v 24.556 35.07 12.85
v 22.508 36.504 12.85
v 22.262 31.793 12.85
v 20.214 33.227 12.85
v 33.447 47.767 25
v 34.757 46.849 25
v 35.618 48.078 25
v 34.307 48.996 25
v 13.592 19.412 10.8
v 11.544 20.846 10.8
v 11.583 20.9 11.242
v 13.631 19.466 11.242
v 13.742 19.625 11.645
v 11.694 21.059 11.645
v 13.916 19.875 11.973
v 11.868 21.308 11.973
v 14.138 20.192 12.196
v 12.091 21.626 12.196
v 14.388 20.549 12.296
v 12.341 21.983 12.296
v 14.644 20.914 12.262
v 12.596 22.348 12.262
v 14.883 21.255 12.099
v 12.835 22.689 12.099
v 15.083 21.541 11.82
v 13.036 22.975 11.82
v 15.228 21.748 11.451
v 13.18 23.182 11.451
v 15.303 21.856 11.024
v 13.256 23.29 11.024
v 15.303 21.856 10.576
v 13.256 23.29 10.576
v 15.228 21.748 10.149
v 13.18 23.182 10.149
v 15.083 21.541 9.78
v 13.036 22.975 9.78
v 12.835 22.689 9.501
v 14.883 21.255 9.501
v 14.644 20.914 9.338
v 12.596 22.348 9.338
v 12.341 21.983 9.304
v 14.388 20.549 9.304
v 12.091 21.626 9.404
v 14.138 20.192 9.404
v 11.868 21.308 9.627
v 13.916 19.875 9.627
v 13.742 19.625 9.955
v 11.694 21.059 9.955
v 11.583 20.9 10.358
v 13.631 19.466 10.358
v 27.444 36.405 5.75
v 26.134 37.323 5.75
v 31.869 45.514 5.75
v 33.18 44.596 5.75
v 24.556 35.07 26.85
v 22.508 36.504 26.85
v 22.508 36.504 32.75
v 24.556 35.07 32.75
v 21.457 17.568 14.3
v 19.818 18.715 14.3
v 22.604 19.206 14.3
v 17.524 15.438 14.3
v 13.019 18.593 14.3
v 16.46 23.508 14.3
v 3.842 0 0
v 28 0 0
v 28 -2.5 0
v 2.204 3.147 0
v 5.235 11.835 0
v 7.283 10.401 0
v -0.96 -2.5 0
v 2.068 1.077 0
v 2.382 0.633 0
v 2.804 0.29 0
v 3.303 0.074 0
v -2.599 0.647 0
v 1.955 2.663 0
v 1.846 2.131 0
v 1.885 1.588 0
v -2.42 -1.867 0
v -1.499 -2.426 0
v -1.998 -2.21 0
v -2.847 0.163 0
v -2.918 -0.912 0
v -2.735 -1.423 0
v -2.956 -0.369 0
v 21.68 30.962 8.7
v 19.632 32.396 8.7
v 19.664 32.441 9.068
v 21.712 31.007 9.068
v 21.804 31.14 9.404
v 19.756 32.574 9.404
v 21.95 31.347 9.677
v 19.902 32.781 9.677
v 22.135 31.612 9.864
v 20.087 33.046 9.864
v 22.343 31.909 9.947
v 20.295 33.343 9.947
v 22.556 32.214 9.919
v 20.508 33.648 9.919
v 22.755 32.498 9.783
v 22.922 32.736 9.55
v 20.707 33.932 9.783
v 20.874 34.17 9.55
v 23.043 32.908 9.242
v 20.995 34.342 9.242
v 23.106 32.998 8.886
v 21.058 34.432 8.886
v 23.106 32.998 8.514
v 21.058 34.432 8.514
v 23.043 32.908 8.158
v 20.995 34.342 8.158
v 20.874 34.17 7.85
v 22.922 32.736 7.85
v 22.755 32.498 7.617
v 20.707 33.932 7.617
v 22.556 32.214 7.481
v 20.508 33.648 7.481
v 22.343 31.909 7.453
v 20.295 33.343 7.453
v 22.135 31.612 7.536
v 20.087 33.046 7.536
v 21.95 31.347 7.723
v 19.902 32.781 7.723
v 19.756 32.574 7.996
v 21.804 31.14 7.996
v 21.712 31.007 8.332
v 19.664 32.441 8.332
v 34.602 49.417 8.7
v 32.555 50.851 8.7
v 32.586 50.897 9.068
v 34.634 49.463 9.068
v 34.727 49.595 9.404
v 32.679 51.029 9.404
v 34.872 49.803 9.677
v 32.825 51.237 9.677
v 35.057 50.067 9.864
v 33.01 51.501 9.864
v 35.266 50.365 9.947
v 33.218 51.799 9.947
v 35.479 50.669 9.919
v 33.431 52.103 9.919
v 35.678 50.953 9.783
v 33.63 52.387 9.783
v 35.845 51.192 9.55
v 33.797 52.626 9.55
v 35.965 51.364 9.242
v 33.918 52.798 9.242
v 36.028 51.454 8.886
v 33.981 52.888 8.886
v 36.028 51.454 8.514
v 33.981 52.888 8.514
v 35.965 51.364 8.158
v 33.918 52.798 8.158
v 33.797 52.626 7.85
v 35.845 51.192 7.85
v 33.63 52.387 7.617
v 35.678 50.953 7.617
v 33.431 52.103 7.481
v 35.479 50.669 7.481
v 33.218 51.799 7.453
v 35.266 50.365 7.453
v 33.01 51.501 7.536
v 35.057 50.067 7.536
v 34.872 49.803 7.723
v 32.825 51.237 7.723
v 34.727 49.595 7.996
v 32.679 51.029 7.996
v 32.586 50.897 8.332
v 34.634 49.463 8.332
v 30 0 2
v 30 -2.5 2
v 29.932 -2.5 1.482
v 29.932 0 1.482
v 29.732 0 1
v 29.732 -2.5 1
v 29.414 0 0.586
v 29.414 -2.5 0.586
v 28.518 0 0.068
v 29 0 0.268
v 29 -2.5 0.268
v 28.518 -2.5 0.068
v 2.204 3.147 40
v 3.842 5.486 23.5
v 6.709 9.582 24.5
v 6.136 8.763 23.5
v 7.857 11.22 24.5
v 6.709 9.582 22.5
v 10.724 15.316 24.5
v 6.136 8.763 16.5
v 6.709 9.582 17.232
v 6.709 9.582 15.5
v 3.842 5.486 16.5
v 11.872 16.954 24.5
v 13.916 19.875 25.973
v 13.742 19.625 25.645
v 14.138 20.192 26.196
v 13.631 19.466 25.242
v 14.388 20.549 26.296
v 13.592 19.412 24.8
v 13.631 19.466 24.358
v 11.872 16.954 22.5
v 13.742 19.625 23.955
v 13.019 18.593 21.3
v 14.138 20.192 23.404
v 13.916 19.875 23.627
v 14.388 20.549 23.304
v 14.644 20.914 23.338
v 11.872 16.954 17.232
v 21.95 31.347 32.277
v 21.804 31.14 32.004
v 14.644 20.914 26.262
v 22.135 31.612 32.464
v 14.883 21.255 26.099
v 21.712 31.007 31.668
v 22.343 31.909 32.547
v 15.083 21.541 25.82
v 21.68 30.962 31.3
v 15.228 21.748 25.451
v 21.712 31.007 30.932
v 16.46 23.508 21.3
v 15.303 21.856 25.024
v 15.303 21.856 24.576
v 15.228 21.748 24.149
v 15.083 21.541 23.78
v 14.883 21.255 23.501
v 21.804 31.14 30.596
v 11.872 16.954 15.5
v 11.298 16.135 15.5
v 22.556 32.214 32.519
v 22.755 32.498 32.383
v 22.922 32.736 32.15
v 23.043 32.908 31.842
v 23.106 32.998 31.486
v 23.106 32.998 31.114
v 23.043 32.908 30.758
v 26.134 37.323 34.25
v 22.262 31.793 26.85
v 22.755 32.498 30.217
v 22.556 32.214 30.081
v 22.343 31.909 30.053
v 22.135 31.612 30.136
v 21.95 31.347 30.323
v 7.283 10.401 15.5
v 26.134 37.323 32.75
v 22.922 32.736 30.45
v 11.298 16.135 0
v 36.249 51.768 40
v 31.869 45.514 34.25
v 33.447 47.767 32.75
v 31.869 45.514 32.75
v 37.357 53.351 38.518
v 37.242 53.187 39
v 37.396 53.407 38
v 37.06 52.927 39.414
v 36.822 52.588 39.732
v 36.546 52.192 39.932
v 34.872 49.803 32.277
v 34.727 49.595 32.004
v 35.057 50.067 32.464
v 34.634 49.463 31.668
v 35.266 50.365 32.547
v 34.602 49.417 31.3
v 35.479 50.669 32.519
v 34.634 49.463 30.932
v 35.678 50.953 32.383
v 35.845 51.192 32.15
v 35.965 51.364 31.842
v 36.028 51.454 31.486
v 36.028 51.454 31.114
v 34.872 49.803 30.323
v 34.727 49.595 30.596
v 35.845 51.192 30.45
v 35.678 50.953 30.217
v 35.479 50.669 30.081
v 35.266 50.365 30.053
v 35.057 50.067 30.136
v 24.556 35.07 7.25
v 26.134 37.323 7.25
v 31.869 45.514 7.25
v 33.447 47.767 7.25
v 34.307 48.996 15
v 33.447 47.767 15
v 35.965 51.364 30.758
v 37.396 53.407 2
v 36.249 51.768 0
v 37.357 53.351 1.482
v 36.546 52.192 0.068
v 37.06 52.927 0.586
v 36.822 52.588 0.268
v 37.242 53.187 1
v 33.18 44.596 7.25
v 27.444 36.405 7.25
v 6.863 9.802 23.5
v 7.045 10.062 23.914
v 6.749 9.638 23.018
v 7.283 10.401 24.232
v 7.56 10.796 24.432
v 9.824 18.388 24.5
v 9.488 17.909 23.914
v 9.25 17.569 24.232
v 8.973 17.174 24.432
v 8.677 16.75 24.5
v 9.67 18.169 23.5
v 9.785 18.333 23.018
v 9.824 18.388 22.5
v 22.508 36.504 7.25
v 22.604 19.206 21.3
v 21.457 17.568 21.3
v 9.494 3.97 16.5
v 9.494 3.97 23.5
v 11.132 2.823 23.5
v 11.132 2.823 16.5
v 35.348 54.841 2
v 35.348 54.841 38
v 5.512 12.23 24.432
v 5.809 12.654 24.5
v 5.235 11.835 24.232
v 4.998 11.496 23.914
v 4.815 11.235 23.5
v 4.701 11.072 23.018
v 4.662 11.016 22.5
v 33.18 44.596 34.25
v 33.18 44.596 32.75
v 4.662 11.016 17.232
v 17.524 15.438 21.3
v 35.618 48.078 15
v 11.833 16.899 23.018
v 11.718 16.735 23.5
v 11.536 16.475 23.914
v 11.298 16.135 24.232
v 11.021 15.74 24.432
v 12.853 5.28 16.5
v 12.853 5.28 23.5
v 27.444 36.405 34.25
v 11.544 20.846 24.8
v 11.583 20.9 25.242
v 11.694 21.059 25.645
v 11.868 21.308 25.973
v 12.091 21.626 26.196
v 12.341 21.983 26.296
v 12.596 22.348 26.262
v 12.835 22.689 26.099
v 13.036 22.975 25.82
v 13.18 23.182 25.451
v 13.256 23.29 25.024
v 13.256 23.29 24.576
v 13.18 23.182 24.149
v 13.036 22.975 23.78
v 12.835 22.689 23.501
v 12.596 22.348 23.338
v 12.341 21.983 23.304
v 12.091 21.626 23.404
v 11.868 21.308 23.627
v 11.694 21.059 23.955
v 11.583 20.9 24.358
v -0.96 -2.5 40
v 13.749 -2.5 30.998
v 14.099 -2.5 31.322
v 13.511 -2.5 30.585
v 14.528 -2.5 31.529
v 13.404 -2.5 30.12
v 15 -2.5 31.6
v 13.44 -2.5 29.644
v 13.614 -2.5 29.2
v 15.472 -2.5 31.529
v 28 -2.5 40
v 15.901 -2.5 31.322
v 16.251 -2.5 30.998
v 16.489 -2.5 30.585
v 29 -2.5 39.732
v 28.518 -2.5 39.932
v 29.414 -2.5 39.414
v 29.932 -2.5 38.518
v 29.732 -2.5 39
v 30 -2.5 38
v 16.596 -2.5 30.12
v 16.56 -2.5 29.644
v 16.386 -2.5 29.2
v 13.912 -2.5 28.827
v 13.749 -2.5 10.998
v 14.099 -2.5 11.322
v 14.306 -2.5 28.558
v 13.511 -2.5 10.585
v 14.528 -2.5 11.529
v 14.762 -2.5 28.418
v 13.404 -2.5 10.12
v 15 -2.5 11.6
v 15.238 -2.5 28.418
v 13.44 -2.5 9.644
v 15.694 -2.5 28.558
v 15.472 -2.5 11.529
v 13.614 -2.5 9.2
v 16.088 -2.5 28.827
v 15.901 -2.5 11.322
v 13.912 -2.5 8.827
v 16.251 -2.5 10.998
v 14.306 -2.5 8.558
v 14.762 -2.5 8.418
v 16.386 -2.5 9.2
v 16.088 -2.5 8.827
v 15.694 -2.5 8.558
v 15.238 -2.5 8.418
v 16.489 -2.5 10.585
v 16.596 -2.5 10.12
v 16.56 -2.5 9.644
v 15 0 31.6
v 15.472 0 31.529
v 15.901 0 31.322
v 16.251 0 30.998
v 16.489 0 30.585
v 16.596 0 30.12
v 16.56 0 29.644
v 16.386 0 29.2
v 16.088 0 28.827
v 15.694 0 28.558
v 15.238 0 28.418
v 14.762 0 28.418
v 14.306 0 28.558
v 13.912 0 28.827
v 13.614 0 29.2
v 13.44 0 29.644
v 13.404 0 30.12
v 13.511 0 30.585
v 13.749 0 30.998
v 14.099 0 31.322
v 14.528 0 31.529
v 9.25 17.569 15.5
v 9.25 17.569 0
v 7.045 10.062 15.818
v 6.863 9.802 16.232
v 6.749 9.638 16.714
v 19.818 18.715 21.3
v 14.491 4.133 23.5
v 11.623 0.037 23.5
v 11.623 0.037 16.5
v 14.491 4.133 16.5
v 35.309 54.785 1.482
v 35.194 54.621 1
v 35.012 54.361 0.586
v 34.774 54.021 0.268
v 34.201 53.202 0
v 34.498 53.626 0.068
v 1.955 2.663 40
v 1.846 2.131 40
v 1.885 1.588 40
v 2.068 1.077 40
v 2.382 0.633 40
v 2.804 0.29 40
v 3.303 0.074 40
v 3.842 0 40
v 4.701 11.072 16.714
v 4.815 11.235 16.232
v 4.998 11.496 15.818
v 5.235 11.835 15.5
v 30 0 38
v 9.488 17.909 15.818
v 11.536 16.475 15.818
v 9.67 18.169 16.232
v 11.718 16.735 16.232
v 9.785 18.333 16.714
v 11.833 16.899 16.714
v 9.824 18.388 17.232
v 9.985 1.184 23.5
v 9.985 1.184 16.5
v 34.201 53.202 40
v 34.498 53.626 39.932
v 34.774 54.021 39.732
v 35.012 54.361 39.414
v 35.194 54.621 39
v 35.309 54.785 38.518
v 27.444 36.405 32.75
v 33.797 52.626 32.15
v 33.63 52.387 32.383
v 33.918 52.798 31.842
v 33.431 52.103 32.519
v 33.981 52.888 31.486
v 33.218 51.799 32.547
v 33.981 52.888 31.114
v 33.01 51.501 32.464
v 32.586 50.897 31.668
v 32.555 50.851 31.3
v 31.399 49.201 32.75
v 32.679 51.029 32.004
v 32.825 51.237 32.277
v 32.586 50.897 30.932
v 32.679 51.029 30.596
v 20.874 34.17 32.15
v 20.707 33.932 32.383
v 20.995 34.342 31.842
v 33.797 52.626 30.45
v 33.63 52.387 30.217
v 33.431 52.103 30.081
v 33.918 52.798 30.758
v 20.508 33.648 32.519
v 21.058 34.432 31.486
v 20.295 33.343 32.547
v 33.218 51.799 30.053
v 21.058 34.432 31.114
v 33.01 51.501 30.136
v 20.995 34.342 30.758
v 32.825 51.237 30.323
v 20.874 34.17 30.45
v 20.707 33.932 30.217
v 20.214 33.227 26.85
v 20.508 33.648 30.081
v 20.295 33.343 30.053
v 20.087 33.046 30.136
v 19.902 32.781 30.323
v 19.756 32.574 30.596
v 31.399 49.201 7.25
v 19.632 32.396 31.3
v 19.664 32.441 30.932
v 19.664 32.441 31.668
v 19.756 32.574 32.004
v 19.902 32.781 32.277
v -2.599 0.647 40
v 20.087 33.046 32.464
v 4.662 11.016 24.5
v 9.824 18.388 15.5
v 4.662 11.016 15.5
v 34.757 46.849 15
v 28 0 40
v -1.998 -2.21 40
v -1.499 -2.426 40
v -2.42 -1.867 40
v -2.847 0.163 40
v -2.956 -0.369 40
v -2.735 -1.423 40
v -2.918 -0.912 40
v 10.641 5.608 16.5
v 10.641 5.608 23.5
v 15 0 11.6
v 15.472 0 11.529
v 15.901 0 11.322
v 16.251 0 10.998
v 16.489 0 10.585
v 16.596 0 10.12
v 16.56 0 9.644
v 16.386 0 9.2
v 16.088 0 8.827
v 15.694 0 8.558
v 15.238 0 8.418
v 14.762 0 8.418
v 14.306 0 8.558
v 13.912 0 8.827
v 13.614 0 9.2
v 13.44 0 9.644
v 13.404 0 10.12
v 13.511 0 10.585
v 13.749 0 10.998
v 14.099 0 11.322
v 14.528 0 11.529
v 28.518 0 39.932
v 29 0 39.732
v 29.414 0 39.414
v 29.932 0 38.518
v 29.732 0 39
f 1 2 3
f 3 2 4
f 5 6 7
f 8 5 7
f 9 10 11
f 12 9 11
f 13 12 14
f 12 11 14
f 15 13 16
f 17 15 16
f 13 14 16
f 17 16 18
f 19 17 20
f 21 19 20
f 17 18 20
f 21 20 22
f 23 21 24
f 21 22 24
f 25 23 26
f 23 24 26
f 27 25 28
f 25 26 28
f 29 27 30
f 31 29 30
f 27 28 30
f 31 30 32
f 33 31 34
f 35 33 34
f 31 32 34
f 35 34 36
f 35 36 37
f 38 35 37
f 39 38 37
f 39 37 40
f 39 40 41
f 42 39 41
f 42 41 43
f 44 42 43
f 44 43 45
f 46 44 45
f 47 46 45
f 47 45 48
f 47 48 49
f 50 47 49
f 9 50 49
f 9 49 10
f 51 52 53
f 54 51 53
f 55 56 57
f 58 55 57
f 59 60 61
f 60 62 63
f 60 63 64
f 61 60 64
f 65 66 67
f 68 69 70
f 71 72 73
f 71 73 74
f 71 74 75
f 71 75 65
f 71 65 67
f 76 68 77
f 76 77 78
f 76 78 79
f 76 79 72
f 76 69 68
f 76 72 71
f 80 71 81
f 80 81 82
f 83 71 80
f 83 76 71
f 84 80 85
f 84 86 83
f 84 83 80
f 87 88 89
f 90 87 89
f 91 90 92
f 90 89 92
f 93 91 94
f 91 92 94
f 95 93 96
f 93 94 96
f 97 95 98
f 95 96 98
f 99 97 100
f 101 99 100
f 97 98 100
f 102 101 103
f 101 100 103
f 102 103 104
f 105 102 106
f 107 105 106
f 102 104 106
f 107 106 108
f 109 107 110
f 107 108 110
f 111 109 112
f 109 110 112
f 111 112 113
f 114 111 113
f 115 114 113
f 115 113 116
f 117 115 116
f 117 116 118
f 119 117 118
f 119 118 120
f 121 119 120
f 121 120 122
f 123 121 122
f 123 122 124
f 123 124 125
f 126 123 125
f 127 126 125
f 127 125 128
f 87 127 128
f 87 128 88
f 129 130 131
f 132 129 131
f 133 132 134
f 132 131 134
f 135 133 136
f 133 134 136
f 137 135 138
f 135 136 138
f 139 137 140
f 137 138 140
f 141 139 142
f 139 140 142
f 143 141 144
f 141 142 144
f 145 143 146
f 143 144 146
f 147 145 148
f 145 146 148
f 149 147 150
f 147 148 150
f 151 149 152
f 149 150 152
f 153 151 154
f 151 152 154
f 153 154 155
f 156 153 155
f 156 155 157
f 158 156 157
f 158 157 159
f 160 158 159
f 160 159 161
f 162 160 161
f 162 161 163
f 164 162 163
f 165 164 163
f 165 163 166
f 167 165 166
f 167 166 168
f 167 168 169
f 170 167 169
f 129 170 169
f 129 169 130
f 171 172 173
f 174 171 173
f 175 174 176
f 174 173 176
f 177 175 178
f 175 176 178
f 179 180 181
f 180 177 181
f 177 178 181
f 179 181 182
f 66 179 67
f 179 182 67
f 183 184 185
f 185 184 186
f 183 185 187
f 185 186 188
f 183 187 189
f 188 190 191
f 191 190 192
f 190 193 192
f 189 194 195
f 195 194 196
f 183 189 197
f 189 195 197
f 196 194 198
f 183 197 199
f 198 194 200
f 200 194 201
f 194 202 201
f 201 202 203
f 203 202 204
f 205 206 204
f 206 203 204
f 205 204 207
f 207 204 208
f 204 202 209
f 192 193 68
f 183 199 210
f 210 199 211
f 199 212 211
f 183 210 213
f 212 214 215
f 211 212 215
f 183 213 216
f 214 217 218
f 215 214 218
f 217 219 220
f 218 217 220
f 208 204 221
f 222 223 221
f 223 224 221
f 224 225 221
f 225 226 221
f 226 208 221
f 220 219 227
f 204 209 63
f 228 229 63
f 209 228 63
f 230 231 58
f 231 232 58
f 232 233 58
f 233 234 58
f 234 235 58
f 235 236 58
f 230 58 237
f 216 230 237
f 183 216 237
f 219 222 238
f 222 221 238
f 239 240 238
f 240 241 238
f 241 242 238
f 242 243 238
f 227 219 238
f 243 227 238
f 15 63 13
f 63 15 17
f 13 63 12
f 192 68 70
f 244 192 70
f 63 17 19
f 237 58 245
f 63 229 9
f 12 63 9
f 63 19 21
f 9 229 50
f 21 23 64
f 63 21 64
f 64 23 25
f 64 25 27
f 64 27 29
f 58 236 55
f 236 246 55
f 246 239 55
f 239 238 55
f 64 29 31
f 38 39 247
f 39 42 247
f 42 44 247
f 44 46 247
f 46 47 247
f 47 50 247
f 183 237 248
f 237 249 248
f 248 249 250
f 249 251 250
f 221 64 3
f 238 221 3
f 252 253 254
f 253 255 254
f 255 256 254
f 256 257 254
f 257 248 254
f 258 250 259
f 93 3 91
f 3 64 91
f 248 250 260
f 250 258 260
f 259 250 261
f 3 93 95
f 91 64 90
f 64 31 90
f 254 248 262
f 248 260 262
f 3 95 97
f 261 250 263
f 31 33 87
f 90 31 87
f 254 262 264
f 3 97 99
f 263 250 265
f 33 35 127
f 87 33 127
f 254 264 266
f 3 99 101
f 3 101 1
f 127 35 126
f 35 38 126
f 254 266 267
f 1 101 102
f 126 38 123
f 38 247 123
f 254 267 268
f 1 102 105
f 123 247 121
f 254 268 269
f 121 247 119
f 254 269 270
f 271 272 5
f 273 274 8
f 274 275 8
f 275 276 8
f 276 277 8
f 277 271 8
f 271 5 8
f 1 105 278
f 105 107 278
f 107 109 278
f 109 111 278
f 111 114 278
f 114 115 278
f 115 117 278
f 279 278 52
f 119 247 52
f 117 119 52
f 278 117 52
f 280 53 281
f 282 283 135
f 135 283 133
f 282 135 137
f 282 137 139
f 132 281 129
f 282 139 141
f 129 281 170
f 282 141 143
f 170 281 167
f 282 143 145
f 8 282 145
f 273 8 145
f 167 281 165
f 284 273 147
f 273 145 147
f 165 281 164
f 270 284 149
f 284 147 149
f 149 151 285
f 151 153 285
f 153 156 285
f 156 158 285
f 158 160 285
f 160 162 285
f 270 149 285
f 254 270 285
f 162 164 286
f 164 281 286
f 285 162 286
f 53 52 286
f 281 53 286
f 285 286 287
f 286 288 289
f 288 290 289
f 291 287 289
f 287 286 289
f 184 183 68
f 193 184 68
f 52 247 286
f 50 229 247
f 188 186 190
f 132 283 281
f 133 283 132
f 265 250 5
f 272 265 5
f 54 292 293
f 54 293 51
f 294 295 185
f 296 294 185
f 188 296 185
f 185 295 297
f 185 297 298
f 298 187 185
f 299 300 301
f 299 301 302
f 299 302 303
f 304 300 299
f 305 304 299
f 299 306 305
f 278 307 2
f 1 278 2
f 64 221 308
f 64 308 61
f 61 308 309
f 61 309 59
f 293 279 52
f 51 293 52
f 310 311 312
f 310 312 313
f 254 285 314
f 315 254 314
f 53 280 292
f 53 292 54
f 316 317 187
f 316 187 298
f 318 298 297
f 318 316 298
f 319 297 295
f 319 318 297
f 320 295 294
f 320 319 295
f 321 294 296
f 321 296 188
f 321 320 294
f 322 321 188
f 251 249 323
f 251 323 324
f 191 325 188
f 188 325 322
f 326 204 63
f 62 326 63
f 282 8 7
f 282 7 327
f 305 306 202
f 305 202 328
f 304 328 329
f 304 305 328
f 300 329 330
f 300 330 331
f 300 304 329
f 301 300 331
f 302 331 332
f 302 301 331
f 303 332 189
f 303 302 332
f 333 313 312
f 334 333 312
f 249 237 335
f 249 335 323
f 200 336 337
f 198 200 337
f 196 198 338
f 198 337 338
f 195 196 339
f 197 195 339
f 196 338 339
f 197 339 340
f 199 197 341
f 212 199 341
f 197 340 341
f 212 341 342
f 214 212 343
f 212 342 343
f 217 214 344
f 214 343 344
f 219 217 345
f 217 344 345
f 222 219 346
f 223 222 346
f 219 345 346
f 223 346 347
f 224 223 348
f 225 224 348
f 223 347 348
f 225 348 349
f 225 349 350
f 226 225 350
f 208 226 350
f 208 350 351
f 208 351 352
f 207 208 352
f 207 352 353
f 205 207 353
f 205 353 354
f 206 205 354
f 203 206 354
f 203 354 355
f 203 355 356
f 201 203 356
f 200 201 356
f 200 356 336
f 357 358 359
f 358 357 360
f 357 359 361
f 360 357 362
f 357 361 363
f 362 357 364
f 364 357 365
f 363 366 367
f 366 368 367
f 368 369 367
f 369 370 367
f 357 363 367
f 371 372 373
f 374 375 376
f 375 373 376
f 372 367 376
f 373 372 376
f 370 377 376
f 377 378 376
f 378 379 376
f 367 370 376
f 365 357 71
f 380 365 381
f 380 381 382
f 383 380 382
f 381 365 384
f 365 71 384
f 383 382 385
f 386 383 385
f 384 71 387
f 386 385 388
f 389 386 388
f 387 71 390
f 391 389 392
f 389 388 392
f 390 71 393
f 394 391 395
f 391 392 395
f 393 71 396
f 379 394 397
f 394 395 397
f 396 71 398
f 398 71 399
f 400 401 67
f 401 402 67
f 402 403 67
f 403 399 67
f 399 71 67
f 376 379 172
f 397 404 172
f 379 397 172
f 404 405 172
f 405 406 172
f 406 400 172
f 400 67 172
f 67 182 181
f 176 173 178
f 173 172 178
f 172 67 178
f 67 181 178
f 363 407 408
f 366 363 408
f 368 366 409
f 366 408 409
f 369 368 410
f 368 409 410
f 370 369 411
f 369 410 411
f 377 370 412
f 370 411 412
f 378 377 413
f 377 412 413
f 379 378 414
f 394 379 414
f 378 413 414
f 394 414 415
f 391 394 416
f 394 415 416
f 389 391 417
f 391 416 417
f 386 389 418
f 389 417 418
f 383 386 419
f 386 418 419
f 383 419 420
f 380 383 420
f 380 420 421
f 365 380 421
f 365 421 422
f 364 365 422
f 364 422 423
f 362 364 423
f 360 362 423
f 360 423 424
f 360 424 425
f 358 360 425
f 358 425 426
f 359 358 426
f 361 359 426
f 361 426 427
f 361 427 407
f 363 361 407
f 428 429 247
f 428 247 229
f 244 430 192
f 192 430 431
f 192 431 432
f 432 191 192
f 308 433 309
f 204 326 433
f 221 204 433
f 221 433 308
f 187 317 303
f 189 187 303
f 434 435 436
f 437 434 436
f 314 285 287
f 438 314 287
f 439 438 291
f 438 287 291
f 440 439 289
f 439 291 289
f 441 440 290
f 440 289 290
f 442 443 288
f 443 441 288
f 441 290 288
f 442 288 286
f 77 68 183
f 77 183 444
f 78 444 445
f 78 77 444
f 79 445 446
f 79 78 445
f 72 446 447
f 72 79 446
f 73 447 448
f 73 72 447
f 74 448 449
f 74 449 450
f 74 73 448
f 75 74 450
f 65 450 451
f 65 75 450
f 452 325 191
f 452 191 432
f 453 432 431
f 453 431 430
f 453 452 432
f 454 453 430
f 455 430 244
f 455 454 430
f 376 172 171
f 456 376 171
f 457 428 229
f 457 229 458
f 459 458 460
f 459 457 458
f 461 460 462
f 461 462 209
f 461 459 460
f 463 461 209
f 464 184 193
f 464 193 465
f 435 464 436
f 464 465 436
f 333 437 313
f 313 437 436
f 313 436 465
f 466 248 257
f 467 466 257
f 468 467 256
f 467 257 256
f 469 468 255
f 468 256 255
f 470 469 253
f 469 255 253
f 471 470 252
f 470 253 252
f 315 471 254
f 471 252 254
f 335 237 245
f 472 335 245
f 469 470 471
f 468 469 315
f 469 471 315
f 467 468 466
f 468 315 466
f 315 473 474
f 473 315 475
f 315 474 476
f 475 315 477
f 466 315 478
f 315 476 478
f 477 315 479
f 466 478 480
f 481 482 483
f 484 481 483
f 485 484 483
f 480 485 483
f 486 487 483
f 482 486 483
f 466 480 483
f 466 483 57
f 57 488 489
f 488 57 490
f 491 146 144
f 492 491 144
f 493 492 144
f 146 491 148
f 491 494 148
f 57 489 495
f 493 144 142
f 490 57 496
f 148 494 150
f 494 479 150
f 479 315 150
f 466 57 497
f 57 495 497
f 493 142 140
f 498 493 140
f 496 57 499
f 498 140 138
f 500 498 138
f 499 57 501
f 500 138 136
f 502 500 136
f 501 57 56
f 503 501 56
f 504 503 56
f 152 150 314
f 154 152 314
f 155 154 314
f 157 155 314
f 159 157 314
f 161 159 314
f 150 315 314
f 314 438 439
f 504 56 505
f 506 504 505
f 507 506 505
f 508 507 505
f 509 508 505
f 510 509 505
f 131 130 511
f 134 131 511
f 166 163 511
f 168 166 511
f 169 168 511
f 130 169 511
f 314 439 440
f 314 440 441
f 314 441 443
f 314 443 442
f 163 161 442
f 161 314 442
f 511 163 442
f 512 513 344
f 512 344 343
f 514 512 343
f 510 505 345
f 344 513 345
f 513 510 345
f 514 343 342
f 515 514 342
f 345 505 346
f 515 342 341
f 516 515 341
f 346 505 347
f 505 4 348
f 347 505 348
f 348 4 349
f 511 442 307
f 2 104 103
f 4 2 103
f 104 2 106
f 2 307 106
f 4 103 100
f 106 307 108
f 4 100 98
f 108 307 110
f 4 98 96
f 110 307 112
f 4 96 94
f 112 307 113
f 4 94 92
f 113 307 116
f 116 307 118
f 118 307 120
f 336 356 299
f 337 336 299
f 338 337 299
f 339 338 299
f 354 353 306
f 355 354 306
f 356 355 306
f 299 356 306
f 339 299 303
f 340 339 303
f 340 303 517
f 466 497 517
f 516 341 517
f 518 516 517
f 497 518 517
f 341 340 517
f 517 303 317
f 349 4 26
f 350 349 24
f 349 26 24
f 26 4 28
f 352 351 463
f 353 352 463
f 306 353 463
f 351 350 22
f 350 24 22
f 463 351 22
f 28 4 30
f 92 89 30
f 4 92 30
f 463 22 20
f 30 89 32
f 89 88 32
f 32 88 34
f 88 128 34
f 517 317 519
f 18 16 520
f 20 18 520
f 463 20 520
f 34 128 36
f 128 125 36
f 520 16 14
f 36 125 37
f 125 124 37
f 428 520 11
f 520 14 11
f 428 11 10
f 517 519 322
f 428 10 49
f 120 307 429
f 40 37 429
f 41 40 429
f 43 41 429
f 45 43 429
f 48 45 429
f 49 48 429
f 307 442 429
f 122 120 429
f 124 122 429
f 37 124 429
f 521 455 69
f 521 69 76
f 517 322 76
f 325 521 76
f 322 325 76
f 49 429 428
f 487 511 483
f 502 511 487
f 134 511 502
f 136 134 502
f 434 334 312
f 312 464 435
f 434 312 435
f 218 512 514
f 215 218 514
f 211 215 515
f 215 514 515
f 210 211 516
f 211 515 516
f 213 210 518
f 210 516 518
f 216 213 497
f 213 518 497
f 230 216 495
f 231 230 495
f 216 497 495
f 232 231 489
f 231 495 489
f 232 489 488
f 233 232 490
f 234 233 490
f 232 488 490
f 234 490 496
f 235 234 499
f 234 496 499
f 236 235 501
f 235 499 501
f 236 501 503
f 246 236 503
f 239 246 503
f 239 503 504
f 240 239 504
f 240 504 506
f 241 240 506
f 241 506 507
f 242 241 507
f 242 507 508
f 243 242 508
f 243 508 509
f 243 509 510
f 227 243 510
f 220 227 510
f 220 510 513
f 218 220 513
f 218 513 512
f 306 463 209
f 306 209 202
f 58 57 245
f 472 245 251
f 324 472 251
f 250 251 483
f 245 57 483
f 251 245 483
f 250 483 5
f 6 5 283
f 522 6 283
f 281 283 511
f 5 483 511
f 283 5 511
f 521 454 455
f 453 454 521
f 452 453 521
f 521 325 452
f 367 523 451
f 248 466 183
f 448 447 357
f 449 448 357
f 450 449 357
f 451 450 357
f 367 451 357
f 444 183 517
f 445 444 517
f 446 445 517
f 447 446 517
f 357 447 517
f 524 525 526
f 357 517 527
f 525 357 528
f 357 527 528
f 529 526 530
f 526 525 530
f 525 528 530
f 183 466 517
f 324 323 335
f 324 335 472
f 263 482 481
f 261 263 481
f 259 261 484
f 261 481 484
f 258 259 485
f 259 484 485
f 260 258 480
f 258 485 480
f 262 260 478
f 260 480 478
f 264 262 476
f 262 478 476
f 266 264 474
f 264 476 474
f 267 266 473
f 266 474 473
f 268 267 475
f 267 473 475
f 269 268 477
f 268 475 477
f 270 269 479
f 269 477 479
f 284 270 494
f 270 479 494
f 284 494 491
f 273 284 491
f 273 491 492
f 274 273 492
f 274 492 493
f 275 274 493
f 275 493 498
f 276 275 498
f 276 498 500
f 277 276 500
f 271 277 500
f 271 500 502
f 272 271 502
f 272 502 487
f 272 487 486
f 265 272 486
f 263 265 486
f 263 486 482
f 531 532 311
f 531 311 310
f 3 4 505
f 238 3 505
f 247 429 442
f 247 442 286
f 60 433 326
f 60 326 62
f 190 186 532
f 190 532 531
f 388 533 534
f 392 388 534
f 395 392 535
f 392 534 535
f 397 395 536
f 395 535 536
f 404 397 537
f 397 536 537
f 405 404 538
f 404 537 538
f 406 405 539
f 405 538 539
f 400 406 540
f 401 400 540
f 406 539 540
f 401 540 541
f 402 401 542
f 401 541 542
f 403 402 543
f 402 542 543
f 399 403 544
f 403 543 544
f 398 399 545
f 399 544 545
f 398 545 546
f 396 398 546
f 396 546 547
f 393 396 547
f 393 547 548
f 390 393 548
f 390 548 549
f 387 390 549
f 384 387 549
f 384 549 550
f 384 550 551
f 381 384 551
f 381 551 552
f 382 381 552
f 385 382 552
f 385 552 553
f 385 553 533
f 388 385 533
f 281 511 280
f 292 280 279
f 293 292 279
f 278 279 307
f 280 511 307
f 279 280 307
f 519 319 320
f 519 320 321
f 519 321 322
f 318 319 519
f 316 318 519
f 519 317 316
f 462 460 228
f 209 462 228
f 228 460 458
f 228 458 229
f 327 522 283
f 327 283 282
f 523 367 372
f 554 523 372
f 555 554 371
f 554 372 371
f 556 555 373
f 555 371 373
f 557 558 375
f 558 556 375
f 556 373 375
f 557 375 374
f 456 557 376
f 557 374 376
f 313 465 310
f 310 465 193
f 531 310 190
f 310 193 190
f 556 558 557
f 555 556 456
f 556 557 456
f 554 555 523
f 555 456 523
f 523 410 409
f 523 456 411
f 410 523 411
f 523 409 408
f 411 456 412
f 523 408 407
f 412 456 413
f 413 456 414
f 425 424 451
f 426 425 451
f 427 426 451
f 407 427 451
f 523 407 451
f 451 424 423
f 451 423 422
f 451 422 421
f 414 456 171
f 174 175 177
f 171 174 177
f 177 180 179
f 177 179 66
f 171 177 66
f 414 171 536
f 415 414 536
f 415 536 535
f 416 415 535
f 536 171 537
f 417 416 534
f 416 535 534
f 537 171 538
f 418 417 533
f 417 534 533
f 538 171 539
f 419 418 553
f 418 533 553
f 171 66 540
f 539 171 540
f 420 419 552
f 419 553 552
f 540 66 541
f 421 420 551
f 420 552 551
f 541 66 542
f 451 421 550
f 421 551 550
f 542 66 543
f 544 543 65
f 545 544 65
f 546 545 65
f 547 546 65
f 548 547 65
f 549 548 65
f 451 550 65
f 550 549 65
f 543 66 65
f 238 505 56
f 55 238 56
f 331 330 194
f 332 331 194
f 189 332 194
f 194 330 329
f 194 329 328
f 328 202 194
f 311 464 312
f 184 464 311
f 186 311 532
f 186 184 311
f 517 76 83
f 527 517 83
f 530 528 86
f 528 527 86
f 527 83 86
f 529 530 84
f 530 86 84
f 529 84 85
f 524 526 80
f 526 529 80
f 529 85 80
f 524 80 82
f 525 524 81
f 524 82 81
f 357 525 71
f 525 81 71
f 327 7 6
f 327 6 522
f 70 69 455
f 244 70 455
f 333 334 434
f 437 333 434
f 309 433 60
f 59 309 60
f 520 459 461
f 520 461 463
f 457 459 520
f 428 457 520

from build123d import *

# Parameters (mm, degrees)
BOSS_EXTRUDE1_DEPTH      = 40
SKETCH2_R                = 1.25
SKETCH2_R_2              = 1.5
SKETCH2_W                = 9
SKETCH2_H                = 9
SKETCH2_W_2              = 15.5
SKETCH2_H_2              = 7
CUT_EXTRUDE2_DEPTH       = 5
SKETCH4_W                = 7
SKETCH4_H                = 4
SKETCH4_H_2              = 2
BOSS_EXTRUDE2_DEPTH      = 5.5
SKETCH6_W                = 7
SKETCH6_H                = 2
BOSS_EXTRUDE3_DEPTH      = 7.5
BOSS_EXTRUDE4_DEPTH      = 3
BOSS_EXTRUDE4_DEPTH_BACK = 2
SKETCH10_W               = 1.5
SKETCH10_H               = 10
SKETCH10_W_2             = 10
SKETCH10_H_2             = 1.5
BOSS_EXTRUDE6_DEPTH      = 1.6
SKETCH5_R                = 1.6
CUT_EXTRUDE3_DEPTH       = 10
FILLET1_R                = 2


with BuildPart() as part:
    # Sketch1 → Boss-Extrude1 (new body)
    with BuildSketch(Plane.XY):
        Polygon((0, 0), (37.395775338, 53.406702009), (35.347895227, 54.8406431), (-4.802455317, -2.5), (0, -2.5), (30, -2.5), (30, 0), align=None)
    extrude(amount=BOSS_EXTRUDE1_DEPTH)

    # Sketch2 → Cut-Extrude2 (cut)
    with BuildSketch(Plane(origin=(-2.047880111, 1.433941091, 0), x_dir=(0, 0, 1), z_dir=(-0.8191520442889935, 0.5735764363510438, 0))):
        Polygon((26.85, 42.812544683), (32.75, 42.812544683), (32.75, 58.312544683), (7.25, 58.312544683), (7.25, 42.812544683), (12.85, 42.812544683), (12.85, 38.812544683), (26.85, 38.812544683), align=None)
        with Locations(Location((8.7, 39.047544683, 0), (0, 0, 270))):
            Circle(SKETCH2_R)
        with Locations(Location((31.3, 39.047544683, 0), (0, 0, 270))):
            Circle(SKETCH2_R)
        with Locations(Location((8.7, 61.577544683, 0), (0, 0, 270))):
            Circle(SKETCH2_R)
        with Locations(Location((31.3, 61.577544683, 0), (0, 0, 270))):
            Circle(SKETCH2_R)
        with Locations(Location((10.8, 25.197544683, 0), (0, 0, 270))):
            Circle(SKETCH2_R_2)
        with Locations(Location((24.8, 25.197544683, 0), (0, 0, 270))):
            Circle(SKETCH2_R_2)
        with Locations((20, 16.197544683)):
            Rectangle(SKETCH2_W, SKETCH2_H)
        with Locations((7.75, 16.197544683)):
            Rectangle(SKETCH2_W_2, SKETCH2_H_2)
    extrude(amount=-CUT_EXTRUDE2_DEPTH, mode=Mode.SUBTRACT)

    # Sketch4 → Boss-Extrude2 (add)
    with BuildSketch(Plane(origin=(0, 0, 0), x_dir=(0, 0, -1), z_dir=(0.8191520442889932, -0.5735764363510439, 0))):
        with Locations((-17.8, 24.697544683)):
            Rectangle(SKETCH4_W, SKETCH4_H)
        with Locations((-20, 9.697544683)):
            Rectangle(SKETCH4_W, SKETCH4_H_2)
    extrude(amount=BOSS_EXTRUDE2_DEPTH)

    # Sketch6 → Boss-Extrude3 (add)
    with BuildSketch(Plane(origin=(0, 0, 0), x_dir=(0, 0, -1), z_dir=(0.8191520442889932, -0.5735764363510439, 0))):
        with Locations((-17.8, 27.697544683)):
            Rectangle(SKETCH6_W, SKETCH6_H)
        with Locations((-20, 7.697544683)):
            Rectangle(SKETCH6_W, SKETCH6_H)
    extrude(amount=BOSS_EXTRUDE3_DEPTH)

    # Sketch8 → Boss-Extrude4 (add, two sides: drawn at the far end of the back side and taken through both)
    with BuildSketch(Plane(origin=(4.988706684, 7.124611507, 21.197544683), x_dir=(0.671010071662837, -0.4698463103929531, -0.5735764363510439), z_dir=(0.5735764363510439, 0.8191520442889935, 0)).offset(-BOSS_EXTRUDE4_DEPTH_BACK)):
        Polygon((8.838041271, -0.453819943), (4.823006216, -6.187884253), (6.461310305, -7.335037125), (10.476345359, -1.600972815), align=None)
    extrude(amount=BOSS_EXTRUDE4_DEPTH + BOSS_EXTRUDE4_DEPTH_BACK)

    # Sketch10 → Boss-Extrude6 (add)
    with BuildSketch(Plane(origin=(0, 0, 0), x_dir=(0, 0, -1), z_dir=(0.8191520442889934, -0.5735764363510439, 0))):
        with Locations((-33.5, 50.562544683)):
            Rectangle(SKETCH10_W, SKETCH10_H)
        with Locations((-6.5, 50.562544683)):
            Rectangle(SKETCH10_W, SKETCH10_H)
        with Locations((-20, 59.062544683)):
            Rectangle(SKETCH10_W_2, SKETCH10_H_2)
    extrude(amount=BOSS_EXTRUDE6_DEPTH)

    # Sketch5 → Cut-Extrude3 (cut)
    with BuildSketch(Plane(origin=(0, 0, 0), x_dir=(1, 0, 0), z_dir=(0, 1, 0))):
        with Locations(Location((15, -10, 0), (0, 0, 270))):
            Circle(SKETCH5_R)
        with Locations(Location((15, -30, 0), (0, 0, 270))):
            Circle(SKETCH5_R)
    extrude(amount=-CUT_EXTRUDE3_DEPTH, mode=Mode.SUBTRACT)

    # Fillet1
    # the kernel refuses this fillet: 2 mm, written as the material it adds along each edge
    with BuildSketch(Plane(origin=(0, 0, 0), x_dir=(0.5735764363510439, 0.8191520442889934, 0), z_dir=(0, 0, 1))) as fillet1_piece_1:
        with BuildLine():
            CenterArc((FILLET1_R * 1.92098212697, -FILLET1_R), FILLET1_R, 90, 125)
            Line((FILLET1_R * 1.10183008268, -FILLET1_R * 1.57357643635), (0, 0))
            Line((0, 0), (FILLET1_R * 1.92098212697, 0))
        make_face()
    extrude(amount=40)
    with BuildSketch(Plane(origin=(9.82374381, 18.388377129, 24.5), x_dir=(-0.5735764363510438, -0.8191520442889935, 0), z_dir=(0.8191520442889935, -0.5735764363510438, 0)), Plane(origin=(4.661555882, 11.016008731, 24.5), x_dir=(0, 0, -1), z_dir=(0.8191520442889935, -0.5735764363510438, 0))) as fillet1_piece_2:
        with BuildLine():
            CenterArc((FILLET1_R, FILLET1_R), FILLET1_R, 180, 90)
            Line((0, FILLET1_R), (0, 0))
            Line((0, 0), (FILLET1_R, 0))
        make_face()
    extrude(amount=2.5)
    with BuildSketch(Plane(origin=(4.661555882, 11.016008731, 15.5), x_dir=(0.5735764363510438, 0.8191520442889935, 7.105427357600794e-14), z_dir=(0.8191520442889935, -0.5735764363510438, 0))) as fillet1_piece_3:
        with BuildLine():
            CenterArc((2, 1.732050808), FILLET1_R, 180, 60)
            Line((0, 1.732050808), (0, 0))
            Line((0, 0), (1, 0))
        make_face()
    extrude(amount=2.5)
    with BuildSketch(Plane(origin=(9.82374381, 18.388377129, 15.5), x_dir=(0, 0, 1), z_dir=(0.8191520442889935, -0.5735764363510438, 0))) as fillet1_piece_4:
        with BuildLine():
            CenterArc((1.732050808, 2), FILLET1_R, 210, 60)
            Line((0, 1), (0, 0))
            Line((0, 0), (1.732050808, 0))
        make_face()
    extrude(amount=2.5)
    # the kernel refuses this fillet: 2 mm, written as the material it takes off along each edge
    with BuildSketch(Plane(origin=(41.491535559, 50.538819828, 40), x_dir=(0, 0, -1), z_dir=(-0.8191520442889935, 0.5735764363510437, 0)), Plane(origin=(30, -7.5, 0), x_dir=(-1, 0, 0), z_dir=(0, 1, 0)), Plane(origin=(41.491535559, 50.538819828, 0), x_dir=(-0.5735764363510438, -0.8191520442889935, 0), z_dir=(-0.8191520442889935, 0.5735764363510437, 0))) as fillet1_2_piece_1:
        with BuildLine():
            CenterArc((FILLET1_R, FILLET1_R), FILLET1_R, 180, 90)
            Line((0, FILLET1_R), (0, 0))
            Line((0, 0), (FILLET1_R, 0))
        make_face()
    extrude(amount=12.5, mode=Mode.SUBTRACT)
    with BuildSketch(Plane(origin=(-4.802455317, -2.5, -9.604910635), x_dir=(1, 0, 0), z_dir=(0, 0, 1))) as fillet1_2_piece_2:
        with BuildLine():
            CenterArc((FILLET1_R * 1.92098212697, FILLET1_R), FILLET1_R, 145, 125)
            Line((FILLET1_R * 1.10183008268, FILLET1_R * 1.57357643635), (0, 0))
            Line((0, 0), (FILLET1_R * 1.92098212697, 0))
        make_face()
    extrude(amount=59.20982127, mode=Mode.SUBTRACT)
    with BuildSketch(Plane(origin=(30, -7.5, 40), x_dir=(-1, 0, 0), z_dir=(0, 1, 0))) as fillet1_2_piece_3:
        with BuildLine():
            CenterArc((FILLET1_R, -FILLET1_R), FILLET1_R, 90, 90)
            Line((0, -FILLET1_R), (0, 0))
            Line((0, 0), (FILLET1_R, 0))
        make_face()
    extrude(amount=12.5, mode=Mode.SUBTRACT)


solid = part.part
